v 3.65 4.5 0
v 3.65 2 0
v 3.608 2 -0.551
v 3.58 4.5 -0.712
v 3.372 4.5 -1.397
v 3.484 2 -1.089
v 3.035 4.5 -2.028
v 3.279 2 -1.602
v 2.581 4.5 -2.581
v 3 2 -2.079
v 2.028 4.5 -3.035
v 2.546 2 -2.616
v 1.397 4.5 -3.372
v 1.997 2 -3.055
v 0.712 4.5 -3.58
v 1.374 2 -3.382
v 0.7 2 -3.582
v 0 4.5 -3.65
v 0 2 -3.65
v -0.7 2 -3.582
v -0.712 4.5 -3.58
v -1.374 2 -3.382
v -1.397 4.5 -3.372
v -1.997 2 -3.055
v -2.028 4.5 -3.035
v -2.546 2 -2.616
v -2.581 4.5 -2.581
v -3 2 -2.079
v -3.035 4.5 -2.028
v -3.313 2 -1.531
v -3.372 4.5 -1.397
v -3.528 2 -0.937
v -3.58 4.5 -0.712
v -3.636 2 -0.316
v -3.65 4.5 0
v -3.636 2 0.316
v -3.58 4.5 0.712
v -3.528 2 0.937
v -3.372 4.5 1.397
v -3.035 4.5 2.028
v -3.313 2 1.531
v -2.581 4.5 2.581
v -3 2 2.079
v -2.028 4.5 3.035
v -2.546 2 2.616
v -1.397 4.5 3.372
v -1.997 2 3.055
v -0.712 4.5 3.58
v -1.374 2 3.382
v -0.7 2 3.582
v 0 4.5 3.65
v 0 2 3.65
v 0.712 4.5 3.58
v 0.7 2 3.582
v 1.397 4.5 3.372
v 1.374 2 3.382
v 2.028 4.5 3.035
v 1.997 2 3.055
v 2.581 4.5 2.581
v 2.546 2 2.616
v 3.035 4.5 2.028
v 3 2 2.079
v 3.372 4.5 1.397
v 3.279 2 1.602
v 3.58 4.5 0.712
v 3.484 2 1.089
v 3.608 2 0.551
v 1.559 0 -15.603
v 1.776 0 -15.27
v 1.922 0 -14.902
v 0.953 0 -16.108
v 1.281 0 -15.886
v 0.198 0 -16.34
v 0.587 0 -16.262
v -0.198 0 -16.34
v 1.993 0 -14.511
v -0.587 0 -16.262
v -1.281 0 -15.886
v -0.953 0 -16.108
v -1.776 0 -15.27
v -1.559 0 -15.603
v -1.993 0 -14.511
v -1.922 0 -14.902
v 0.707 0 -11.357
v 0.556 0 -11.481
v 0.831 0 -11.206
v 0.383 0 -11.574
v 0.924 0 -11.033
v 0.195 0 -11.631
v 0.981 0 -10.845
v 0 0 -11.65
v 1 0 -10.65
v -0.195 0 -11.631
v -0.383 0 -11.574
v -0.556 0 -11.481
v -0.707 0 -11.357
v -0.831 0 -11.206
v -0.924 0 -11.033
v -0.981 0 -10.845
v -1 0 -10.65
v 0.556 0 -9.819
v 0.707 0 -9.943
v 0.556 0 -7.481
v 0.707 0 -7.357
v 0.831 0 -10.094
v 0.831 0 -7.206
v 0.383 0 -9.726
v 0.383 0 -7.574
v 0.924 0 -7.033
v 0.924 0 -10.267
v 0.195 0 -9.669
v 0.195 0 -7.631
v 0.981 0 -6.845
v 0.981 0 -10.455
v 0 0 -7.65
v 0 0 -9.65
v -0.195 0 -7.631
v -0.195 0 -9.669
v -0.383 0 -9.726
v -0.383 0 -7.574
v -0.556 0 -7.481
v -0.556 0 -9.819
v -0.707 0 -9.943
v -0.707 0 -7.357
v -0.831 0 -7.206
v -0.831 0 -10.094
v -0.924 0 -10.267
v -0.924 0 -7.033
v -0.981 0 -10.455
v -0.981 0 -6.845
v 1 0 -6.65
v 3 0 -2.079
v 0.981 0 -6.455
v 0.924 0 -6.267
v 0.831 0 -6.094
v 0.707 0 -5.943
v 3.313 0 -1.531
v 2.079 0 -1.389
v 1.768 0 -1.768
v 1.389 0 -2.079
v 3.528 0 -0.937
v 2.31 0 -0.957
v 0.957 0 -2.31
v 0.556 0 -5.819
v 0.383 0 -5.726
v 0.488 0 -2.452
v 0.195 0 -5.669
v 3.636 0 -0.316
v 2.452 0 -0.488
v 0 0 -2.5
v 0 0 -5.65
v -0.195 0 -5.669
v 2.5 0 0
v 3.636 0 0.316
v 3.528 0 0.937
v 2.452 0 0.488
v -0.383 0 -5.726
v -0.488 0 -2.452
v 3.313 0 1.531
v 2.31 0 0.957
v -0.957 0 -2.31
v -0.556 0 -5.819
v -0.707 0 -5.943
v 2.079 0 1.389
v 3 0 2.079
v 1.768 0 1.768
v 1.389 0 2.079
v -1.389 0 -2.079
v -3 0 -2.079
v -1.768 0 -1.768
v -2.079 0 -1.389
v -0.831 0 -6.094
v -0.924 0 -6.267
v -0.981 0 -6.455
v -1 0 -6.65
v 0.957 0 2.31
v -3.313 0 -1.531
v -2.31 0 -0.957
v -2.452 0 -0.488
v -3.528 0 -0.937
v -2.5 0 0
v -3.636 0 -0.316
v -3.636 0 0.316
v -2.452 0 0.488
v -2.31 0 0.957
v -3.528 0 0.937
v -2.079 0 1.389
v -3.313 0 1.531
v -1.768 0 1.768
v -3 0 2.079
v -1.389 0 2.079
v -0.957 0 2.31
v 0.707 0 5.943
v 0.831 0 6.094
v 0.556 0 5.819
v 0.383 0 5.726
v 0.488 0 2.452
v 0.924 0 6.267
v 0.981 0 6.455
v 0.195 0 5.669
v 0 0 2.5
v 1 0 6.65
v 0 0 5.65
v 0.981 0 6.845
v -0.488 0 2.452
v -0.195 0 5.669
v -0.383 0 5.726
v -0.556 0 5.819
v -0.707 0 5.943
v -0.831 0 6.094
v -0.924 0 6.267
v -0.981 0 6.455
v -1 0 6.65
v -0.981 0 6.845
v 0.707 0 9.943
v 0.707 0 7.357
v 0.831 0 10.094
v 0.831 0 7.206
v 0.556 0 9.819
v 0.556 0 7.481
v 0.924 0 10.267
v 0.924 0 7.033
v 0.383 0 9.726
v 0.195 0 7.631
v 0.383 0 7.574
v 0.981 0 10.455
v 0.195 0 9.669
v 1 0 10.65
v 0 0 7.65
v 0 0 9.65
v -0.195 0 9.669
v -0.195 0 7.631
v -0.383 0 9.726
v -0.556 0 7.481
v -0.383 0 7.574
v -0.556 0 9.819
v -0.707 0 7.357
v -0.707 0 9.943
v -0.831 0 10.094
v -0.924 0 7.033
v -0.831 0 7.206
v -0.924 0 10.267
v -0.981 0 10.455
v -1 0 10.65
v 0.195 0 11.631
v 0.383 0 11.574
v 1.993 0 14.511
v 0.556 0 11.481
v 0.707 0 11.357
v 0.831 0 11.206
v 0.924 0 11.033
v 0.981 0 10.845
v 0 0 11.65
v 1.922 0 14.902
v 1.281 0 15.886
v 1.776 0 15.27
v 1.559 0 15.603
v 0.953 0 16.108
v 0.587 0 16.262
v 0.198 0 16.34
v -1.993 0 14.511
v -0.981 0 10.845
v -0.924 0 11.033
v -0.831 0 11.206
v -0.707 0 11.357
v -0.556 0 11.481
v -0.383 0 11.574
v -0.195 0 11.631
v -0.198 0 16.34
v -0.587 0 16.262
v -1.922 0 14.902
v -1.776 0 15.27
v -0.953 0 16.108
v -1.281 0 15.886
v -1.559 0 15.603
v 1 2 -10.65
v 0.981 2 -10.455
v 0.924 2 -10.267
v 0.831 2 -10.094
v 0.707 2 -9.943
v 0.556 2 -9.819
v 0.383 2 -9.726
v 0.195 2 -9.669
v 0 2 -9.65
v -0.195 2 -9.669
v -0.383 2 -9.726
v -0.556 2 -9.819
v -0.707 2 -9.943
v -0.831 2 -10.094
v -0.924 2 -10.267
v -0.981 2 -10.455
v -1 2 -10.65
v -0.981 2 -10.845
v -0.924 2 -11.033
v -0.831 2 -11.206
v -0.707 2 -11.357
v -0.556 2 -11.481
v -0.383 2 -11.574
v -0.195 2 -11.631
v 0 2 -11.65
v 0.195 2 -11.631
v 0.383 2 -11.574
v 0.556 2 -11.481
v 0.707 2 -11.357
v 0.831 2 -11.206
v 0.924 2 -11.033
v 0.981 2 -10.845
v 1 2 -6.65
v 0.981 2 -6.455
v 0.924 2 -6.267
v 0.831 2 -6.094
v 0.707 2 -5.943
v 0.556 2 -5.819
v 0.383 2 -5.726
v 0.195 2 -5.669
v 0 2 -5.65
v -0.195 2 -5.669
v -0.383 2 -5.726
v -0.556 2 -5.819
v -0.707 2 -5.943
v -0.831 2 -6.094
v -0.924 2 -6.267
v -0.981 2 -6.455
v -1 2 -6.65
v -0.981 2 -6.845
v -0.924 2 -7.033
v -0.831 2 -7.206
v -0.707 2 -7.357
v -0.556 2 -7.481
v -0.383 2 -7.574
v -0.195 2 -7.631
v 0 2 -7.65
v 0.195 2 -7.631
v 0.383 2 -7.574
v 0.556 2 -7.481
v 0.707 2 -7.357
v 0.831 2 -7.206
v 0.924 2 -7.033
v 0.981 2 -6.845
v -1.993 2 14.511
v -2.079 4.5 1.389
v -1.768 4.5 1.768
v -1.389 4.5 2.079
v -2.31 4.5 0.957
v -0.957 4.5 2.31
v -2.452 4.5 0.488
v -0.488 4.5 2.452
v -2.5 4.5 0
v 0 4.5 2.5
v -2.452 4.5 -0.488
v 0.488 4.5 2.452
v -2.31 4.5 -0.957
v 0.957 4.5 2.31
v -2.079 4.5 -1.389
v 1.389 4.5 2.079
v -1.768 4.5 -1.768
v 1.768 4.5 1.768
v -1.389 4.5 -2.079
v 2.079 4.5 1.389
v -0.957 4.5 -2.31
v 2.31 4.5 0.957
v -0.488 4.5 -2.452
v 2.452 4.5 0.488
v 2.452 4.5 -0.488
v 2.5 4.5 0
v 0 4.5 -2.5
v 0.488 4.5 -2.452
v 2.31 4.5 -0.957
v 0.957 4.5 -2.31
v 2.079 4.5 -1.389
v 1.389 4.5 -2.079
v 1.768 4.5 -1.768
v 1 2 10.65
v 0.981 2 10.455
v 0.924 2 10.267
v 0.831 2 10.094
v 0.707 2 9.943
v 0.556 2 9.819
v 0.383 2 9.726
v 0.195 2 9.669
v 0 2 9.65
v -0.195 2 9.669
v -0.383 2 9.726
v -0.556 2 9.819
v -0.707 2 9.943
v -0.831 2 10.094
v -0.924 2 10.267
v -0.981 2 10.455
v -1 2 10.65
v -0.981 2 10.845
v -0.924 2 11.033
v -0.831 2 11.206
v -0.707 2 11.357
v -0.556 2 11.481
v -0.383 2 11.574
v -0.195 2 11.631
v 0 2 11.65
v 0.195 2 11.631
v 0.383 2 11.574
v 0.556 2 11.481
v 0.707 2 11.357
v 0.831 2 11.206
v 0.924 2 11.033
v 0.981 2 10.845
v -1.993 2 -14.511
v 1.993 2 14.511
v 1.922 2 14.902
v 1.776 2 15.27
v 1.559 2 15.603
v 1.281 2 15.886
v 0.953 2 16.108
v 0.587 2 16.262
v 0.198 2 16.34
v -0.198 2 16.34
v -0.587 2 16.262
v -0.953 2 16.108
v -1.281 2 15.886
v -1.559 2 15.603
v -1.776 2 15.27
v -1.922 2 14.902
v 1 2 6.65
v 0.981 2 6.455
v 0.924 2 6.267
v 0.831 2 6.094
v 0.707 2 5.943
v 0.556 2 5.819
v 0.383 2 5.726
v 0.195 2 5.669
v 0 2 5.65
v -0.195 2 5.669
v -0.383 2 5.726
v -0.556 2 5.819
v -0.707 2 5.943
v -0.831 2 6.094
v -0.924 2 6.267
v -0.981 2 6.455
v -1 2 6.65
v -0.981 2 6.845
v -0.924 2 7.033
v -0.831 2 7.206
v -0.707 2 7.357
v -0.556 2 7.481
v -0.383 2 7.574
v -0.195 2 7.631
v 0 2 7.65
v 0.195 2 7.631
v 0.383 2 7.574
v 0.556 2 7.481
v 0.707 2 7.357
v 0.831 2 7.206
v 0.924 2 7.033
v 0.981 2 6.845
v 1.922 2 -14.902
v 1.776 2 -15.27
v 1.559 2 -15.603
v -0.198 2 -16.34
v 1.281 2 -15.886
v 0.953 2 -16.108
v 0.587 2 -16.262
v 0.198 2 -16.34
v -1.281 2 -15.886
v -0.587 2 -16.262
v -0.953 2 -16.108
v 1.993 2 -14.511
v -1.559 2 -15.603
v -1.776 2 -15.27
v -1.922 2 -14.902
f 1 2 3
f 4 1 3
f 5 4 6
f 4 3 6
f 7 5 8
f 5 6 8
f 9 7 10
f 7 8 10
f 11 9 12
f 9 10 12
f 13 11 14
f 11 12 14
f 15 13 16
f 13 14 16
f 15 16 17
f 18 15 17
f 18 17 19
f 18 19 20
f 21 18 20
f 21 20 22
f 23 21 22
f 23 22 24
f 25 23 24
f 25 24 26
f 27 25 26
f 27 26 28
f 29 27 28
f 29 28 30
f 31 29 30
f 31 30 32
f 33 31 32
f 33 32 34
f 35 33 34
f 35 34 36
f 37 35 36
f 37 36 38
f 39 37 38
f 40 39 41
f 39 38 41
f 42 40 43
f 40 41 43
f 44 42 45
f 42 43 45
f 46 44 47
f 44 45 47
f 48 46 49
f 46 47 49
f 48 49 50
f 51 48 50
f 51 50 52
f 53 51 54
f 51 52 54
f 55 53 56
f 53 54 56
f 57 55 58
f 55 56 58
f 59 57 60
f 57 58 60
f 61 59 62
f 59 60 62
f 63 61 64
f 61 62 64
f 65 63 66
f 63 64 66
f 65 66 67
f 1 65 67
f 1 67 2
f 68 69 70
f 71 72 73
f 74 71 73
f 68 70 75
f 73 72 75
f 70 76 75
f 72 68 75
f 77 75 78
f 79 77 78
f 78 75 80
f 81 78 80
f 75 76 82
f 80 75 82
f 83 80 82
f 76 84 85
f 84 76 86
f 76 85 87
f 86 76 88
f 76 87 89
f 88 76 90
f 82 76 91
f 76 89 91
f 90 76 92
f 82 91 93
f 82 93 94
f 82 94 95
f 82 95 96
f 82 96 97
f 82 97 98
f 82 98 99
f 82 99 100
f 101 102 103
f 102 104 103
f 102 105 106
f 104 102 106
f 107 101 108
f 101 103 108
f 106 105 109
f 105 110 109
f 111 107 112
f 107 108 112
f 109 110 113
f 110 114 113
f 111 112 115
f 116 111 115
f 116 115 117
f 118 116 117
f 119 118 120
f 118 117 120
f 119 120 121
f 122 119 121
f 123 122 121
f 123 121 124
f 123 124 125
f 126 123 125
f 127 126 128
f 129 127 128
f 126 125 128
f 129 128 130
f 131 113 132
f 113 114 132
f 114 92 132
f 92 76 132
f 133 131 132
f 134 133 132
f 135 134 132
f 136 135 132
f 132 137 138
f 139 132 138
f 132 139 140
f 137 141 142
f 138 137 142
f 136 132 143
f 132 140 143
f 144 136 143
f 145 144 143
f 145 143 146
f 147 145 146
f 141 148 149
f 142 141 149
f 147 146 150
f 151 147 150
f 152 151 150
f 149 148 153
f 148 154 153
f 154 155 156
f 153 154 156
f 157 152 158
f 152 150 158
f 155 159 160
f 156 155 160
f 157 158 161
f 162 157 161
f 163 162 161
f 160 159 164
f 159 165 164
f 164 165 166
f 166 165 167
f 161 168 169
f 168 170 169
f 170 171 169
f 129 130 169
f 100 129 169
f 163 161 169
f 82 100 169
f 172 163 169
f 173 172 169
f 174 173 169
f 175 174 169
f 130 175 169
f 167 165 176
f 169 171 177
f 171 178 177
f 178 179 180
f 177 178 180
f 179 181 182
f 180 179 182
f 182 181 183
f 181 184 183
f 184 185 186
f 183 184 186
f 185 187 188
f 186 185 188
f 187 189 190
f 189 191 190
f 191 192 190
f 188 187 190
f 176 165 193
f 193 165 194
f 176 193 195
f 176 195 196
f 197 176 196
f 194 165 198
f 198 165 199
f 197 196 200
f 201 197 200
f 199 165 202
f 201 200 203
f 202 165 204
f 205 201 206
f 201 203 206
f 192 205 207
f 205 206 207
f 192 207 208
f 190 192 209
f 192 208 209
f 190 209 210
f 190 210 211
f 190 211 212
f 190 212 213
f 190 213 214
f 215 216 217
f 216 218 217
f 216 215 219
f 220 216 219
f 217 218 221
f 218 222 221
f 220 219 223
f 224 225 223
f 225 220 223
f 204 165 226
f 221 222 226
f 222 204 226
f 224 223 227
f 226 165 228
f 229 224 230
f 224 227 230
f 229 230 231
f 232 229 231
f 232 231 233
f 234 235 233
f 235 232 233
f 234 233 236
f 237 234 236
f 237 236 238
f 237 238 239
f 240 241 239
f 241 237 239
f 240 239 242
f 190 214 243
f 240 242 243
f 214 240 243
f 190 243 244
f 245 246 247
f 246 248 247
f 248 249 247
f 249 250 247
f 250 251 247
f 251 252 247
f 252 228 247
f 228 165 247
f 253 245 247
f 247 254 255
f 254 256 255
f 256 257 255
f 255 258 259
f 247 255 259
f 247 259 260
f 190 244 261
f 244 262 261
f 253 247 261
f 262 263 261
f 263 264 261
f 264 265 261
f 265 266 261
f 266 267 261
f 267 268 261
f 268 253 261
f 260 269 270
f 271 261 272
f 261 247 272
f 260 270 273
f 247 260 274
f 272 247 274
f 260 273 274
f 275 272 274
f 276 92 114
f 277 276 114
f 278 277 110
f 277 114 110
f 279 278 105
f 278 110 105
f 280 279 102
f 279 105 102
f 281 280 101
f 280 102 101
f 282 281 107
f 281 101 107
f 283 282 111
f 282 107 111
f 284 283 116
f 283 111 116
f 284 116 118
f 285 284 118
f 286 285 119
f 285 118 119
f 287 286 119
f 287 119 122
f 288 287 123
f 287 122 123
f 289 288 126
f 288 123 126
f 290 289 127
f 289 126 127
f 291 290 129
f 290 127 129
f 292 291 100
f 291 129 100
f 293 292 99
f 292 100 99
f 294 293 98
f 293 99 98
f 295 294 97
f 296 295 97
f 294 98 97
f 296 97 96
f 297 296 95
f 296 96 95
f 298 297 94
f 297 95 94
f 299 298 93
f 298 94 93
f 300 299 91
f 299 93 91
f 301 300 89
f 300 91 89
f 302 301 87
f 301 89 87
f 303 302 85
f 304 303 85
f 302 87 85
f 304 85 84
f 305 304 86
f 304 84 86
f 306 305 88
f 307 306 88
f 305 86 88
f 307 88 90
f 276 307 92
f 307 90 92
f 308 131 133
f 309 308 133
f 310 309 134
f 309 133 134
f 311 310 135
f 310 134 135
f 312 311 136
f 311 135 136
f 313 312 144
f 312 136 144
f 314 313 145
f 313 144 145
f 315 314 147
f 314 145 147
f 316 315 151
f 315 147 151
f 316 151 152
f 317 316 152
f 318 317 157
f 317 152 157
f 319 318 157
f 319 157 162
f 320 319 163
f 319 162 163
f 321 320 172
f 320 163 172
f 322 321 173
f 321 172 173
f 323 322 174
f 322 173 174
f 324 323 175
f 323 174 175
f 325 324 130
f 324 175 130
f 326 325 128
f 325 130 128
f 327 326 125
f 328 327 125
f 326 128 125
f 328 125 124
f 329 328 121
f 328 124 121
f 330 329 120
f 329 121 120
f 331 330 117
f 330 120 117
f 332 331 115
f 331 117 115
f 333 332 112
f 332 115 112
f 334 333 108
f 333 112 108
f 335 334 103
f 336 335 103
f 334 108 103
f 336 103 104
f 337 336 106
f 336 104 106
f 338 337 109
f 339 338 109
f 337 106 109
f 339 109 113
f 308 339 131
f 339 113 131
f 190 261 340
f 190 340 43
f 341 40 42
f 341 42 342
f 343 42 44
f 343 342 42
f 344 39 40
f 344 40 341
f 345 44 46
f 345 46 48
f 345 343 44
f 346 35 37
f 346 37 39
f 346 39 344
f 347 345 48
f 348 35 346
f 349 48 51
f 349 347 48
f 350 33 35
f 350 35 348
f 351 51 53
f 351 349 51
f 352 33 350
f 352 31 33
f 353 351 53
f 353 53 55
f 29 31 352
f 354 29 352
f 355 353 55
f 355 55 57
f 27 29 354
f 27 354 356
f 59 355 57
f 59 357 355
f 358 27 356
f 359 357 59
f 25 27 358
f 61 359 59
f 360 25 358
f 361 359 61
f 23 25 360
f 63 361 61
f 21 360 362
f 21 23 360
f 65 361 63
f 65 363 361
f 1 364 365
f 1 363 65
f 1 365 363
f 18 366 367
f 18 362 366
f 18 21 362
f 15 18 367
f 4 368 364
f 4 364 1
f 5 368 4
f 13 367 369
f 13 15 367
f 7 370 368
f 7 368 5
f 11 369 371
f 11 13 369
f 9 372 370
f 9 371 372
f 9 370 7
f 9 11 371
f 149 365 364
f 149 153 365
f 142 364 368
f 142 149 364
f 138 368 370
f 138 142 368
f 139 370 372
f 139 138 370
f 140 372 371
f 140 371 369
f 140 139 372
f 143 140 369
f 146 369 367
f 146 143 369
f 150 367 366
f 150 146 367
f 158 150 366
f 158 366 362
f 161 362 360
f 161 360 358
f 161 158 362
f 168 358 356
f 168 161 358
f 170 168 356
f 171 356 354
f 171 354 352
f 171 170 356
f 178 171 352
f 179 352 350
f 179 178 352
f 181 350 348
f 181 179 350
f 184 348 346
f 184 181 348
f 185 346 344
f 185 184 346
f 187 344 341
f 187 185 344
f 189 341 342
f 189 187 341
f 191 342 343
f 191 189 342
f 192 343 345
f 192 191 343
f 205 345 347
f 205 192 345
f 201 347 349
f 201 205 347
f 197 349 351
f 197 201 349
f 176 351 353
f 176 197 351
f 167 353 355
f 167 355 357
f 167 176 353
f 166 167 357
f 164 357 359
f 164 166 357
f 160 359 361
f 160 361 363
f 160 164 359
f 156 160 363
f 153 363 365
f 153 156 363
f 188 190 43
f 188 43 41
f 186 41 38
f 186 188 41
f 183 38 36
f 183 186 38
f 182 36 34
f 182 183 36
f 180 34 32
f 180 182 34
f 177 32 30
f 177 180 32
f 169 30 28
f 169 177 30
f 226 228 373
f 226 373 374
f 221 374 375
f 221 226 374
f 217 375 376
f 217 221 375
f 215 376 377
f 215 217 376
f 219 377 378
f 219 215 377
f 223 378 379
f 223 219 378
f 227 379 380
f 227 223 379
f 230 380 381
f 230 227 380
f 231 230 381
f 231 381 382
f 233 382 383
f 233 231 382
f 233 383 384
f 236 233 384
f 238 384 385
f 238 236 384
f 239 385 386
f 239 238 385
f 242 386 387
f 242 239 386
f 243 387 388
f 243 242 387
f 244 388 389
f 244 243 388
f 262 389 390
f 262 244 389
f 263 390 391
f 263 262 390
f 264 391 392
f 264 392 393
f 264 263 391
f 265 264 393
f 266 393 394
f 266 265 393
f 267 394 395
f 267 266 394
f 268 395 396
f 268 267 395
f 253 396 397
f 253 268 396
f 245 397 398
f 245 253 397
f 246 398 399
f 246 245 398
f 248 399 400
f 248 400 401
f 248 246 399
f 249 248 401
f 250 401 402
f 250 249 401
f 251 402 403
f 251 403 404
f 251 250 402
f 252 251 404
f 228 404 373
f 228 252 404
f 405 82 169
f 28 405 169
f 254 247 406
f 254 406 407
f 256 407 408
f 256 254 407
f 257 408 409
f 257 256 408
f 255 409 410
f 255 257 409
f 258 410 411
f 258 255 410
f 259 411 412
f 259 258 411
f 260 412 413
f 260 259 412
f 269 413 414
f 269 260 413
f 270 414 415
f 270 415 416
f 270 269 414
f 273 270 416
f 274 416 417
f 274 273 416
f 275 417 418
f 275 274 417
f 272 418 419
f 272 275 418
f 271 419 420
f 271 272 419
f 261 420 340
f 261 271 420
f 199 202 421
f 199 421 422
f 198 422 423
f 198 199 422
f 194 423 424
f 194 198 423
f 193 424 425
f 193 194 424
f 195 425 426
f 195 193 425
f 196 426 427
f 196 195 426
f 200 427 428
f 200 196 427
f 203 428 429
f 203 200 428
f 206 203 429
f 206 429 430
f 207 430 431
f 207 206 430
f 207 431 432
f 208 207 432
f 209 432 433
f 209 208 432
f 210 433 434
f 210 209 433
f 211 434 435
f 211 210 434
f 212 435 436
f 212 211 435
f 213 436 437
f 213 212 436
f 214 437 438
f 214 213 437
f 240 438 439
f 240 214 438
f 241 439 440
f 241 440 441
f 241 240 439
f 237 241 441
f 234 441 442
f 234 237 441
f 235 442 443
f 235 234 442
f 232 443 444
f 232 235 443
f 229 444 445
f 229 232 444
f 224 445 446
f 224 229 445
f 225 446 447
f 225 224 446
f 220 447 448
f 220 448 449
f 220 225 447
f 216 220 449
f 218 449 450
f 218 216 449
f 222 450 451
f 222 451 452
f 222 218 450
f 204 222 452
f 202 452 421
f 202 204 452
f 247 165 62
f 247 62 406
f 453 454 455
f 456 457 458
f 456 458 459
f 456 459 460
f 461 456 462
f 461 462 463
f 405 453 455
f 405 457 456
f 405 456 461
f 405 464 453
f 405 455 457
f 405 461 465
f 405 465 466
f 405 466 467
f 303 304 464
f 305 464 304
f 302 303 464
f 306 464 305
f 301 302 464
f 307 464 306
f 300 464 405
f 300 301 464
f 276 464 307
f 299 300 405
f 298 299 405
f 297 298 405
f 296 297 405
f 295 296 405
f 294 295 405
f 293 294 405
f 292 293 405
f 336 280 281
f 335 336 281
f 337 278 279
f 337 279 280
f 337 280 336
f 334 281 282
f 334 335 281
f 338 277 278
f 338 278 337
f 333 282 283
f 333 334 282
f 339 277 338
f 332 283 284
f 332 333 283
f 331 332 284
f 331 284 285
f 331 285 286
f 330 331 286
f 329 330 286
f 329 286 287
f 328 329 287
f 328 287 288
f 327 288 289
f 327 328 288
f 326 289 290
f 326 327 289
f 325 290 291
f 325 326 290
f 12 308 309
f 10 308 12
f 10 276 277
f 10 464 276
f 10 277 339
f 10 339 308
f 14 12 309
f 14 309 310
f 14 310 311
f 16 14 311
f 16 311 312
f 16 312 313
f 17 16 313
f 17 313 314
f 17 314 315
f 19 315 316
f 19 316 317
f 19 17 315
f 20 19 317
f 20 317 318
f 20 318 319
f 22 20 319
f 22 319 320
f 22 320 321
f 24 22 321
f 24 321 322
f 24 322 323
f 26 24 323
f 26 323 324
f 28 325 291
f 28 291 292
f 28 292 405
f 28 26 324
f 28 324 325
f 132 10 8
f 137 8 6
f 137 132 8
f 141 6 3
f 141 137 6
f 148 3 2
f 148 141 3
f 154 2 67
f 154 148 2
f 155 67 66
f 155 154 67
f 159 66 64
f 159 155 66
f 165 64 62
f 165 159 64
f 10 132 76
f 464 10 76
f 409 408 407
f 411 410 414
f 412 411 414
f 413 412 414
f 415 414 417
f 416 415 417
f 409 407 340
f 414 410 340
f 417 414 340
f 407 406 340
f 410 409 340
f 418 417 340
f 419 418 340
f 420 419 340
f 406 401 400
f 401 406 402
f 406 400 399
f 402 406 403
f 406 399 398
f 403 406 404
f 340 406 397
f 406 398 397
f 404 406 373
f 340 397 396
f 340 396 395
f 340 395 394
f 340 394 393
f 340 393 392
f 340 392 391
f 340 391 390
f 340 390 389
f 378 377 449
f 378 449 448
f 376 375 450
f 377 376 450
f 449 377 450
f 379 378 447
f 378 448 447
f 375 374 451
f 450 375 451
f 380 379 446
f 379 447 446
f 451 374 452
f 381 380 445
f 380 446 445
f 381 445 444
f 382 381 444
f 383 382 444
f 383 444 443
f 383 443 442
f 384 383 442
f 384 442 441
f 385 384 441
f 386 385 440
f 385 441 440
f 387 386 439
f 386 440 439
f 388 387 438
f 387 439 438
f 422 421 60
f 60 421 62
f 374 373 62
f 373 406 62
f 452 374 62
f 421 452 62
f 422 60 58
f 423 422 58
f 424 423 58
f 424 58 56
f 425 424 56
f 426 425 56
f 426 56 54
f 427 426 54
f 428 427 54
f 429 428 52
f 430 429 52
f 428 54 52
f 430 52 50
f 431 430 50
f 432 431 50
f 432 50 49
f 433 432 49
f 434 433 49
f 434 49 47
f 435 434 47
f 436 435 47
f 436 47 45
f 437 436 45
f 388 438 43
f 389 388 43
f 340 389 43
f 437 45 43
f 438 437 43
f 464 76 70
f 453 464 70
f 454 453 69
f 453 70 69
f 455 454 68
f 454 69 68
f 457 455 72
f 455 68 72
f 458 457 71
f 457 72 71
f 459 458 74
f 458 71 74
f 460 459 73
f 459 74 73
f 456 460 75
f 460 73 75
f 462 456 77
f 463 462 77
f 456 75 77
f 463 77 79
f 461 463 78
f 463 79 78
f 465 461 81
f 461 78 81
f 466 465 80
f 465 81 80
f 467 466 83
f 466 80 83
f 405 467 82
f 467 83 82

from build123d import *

# Parameters (mm, degrees)
SKETCH1_R           = 1
SKETCH1_R_2         = 2.5
BOSS_EXTRUDE1_DEPTH = 2
SKETCH2_R           = 3.65
SKETCH2_R_2         = 2.5
BOSS_EXTRUDE2_DEPTH = 2.5


with BuildPart() as part:
    # Sketch1 → Boss-Extrude1 (new body)
    with BuildSketch(Plane(origin=(0, 0, 0), x_dir=(1, 0, 0), z_dir=(0, 1, 0))):
        with BuildLine():
            Line((3, -2.079062289), (1.993477511, -14.51139211))
            ThreePointArc((1.993477511, -14.51139211), (0, -16.35), (-1.993477511, -14.51139211))
            Line((-1.993477511, -14.51139211), (-3, -2.079062289))
            ThreePointArc((-3, -2.079062289), (0, 3.65), (3, -2.079062289))
        make_face()
        with Locations((0, -6.65)):
            Circle(SKETCH1_R, mode=Mode.SUBTRACT)
        with Locations((0, -10.65)):
            Circle(SKETCH1_R, mode=Mode.SUBTRACT)
        Circle(SKETCH1_R_2, mode=Mode.SUBTRACT)
    boss_extrude1 = extrude(amount=BOSS_EXTRUDE1_DEPTH)

    # Sketch2 → Boss-Extrude2 (add)
    with BuildSketch(Plane(origin=(0, 2, 0), x_dir=(1, 0, 0), z_dir=(0, 1, 0))):
        Circle(SKETCH2_R)
        Circle(SKETCH2_R_2, mode=Mode.SUBTRACT)
    boss_extrude2 = extrude(amount=BOSS_EXTRUDE2_DEPTH)

    # Mirror1: Boss-Extrude1, Boss-Extrude2 across plane
    add(boss_extrude1.mirror(Plane.XY))
    add(boss_extrude2.mirror(Plane.XY))


solid = part.part
